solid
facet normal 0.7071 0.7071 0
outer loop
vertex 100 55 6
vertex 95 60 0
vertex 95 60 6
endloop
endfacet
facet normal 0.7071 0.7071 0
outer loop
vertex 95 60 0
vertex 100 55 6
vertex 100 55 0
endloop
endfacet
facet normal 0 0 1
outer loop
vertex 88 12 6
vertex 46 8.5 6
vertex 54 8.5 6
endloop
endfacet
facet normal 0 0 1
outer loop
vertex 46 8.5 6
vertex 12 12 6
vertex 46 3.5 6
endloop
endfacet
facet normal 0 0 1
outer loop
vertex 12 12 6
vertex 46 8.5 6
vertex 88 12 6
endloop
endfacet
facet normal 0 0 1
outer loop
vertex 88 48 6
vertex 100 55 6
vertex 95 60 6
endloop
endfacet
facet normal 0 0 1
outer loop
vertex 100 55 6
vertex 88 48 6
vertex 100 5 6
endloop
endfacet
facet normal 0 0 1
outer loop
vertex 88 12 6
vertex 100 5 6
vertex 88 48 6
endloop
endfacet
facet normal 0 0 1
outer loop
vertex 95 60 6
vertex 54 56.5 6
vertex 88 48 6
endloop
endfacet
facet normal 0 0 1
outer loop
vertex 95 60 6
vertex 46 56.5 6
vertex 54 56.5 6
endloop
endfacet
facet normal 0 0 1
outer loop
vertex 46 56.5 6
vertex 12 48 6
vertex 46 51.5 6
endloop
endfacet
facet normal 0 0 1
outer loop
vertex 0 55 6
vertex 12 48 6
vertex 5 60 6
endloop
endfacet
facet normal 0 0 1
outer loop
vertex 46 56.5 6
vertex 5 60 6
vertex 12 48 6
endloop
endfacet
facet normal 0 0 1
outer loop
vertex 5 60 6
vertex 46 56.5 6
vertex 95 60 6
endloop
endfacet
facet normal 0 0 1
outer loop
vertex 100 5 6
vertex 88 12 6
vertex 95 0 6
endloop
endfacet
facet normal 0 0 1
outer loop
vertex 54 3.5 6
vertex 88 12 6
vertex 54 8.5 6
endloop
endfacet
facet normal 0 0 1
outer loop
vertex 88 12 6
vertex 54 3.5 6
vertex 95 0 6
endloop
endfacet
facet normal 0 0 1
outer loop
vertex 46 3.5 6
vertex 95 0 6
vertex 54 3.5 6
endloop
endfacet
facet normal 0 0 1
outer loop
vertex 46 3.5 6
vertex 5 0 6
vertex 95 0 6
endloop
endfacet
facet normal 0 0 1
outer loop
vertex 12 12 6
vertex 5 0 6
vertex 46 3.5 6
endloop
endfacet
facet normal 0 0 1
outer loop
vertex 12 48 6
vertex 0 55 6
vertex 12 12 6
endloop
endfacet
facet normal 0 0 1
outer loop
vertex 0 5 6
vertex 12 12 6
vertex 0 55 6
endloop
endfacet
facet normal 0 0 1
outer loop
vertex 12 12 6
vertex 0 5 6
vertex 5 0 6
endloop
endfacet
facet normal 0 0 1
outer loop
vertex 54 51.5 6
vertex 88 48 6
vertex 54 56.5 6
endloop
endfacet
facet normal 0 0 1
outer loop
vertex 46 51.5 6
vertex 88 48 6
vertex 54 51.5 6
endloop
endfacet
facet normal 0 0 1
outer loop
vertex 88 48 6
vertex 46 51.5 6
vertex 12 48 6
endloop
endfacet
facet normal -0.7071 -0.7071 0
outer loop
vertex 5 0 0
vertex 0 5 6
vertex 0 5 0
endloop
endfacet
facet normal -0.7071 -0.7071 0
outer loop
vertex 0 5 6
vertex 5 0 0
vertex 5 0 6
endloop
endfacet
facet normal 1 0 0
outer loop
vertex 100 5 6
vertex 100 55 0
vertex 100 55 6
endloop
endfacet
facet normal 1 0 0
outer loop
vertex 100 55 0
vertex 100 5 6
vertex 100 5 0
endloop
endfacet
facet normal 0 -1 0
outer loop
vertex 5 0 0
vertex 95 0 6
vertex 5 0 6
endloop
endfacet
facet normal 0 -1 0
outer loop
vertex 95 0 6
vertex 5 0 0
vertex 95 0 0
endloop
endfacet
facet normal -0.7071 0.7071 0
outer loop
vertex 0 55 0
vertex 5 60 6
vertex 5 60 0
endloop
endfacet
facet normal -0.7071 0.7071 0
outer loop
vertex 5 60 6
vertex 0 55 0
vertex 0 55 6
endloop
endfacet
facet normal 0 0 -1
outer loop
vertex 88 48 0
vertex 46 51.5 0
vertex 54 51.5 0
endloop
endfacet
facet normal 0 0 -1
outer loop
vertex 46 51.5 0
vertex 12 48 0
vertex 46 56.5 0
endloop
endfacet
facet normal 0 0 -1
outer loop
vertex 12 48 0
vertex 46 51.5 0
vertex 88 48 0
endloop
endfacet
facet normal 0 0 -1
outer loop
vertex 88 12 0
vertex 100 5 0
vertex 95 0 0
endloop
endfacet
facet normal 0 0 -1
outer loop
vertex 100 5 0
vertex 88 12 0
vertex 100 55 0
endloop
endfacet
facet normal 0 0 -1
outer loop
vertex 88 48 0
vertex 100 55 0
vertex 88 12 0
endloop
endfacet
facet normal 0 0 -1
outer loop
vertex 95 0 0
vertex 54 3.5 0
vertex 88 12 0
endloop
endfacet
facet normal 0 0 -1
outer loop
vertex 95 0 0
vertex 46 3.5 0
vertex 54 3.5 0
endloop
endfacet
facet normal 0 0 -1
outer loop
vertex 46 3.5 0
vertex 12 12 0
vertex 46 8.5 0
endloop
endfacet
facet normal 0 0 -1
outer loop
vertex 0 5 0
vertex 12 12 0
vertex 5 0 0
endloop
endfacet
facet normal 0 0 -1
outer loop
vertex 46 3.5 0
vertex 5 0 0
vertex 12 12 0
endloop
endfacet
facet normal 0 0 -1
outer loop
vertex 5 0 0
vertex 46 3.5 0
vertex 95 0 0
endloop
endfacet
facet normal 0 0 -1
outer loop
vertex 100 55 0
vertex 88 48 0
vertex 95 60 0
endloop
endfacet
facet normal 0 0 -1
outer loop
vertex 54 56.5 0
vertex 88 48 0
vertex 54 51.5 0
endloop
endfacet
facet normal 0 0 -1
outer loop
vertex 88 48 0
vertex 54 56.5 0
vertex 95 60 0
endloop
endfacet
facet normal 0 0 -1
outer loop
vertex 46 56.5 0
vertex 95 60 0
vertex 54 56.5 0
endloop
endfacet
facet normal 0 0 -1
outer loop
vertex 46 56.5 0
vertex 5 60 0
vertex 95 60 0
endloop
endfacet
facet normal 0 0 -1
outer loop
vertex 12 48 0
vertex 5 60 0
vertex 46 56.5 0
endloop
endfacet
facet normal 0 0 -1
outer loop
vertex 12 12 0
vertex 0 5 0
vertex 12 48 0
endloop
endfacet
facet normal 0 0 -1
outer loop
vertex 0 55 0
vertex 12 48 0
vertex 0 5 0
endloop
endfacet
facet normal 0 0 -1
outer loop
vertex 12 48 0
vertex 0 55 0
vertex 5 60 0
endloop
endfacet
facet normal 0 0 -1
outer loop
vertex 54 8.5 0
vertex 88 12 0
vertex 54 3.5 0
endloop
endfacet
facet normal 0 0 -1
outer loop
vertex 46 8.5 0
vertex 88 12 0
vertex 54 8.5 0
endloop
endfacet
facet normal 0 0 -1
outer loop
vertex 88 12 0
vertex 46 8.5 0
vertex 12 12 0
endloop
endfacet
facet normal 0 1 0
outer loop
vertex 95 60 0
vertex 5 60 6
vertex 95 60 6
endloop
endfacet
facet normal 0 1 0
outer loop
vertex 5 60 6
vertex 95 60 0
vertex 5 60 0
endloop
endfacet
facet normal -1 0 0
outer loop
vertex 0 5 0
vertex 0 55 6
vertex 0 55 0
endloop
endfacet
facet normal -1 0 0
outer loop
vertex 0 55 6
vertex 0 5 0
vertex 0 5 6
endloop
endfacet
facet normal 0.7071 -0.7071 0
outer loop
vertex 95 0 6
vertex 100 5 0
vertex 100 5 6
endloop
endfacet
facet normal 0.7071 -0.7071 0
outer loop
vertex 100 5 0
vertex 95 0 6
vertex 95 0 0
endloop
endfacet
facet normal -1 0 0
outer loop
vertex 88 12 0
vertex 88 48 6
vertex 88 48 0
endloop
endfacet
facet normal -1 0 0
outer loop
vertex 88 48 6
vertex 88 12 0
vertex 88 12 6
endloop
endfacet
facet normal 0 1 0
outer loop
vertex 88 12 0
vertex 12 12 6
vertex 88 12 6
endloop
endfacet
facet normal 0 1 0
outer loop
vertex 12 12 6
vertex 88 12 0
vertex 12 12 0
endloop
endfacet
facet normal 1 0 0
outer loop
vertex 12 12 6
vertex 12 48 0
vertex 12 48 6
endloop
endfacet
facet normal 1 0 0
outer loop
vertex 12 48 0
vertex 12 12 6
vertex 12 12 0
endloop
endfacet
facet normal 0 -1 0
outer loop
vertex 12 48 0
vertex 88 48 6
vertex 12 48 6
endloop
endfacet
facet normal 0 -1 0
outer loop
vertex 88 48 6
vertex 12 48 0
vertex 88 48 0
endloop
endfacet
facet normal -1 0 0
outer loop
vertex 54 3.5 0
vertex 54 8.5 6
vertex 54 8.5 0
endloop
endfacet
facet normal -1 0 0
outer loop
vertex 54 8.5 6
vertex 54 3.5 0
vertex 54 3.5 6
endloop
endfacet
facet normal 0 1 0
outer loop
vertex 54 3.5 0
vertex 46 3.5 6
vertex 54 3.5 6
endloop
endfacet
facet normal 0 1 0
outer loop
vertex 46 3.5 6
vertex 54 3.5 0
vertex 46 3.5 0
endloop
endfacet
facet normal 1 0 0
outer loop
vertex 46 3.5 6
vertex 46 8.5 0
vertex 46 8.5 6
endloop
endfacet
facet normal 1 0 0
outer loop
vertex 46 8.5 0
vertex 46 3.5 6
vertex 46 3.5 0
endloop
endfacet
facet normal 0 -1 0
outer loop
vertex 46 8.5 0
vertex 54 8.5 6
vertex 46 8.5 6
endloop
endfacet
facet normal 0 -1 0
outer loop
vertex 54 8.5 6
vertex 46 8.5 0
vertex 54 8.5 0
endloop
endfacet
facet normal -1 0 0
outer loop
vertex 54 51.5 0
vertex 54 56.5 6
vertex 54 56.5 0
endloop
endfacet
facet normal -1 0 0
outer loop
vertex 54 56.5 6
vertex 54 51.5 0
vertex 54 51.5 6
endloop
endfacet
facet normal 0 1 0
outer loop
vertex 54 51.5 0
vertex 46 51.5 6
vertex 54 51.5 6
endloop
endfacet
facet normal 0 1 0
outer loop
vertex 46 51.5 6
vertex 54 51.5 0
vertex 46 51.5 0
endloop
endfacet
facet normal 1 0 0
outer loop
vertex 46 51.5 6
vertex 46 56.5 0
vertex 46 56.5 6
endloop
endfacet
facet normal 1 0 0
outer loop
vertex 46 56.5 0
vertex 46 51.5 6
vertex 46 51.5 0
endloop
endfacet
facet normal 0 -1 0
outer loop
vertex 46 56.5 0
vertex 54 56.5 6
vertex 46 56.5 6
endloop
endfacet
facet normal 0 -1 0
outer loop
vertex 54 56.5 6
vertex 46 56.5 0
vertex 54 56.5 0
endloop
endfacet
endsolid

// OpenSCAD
$fn = 32;

// ----------------------------------------------------------------------
// Frame plate: 100 x 60 frame, 12 mm rails
// ----------------------------------------------------------------------

// --- parameters (mm) ---
plate_l = 100;            // plate length, X
plate_w = 60;             // plate width, Y
plate_t = 6;              // plate thickness, Z (extrusion height)
corner_c = 5;             // corner chamfer
frame_bar = 12;           // frame rail width
slot_l = 8;               // adjustment slot length
slot_w = 5;               // adjustment slot width

win_l = plate_l - 2 * frame_bar;  // window length
win_w = plate_w - 2 * frame_bar;  // window width

profile = [[5, 0], [95, 0], [100, 5], [100, 55], [95, 60], [5, 60], [0, 55], [0, 5]];  // primary outline, 8 points, counter clockwise
void_1 = [[12, 12], [88, 12], [88, 48], [12, 48]];  // the window, 4 points
void_2 = [[46, 3.5], [54, 3.5], [54, 8.5], [46, 8.5]];  // adjustment slot, 4 points
void_3 = [[46, 51.5], [54, 51.5], [54, 56.5], [46, 56.5]];  // adjustment slot, 4 points

// --- the one profile operation ---
difference() {
  linear_extrude(height = plate_t) polygon(points = profile);
  translate([0, 0, -1])
    linear_extrude(height = plate_t + 2) polygon(points = void_1);
  translate([0, 0, -1])
    linear_extrude(height = plate_t + 2) polygon(points = void_2);
  translate([0, 0, -1])
    linear_extrude(height = plate_t + 2) polygon(points = void_3);
}
